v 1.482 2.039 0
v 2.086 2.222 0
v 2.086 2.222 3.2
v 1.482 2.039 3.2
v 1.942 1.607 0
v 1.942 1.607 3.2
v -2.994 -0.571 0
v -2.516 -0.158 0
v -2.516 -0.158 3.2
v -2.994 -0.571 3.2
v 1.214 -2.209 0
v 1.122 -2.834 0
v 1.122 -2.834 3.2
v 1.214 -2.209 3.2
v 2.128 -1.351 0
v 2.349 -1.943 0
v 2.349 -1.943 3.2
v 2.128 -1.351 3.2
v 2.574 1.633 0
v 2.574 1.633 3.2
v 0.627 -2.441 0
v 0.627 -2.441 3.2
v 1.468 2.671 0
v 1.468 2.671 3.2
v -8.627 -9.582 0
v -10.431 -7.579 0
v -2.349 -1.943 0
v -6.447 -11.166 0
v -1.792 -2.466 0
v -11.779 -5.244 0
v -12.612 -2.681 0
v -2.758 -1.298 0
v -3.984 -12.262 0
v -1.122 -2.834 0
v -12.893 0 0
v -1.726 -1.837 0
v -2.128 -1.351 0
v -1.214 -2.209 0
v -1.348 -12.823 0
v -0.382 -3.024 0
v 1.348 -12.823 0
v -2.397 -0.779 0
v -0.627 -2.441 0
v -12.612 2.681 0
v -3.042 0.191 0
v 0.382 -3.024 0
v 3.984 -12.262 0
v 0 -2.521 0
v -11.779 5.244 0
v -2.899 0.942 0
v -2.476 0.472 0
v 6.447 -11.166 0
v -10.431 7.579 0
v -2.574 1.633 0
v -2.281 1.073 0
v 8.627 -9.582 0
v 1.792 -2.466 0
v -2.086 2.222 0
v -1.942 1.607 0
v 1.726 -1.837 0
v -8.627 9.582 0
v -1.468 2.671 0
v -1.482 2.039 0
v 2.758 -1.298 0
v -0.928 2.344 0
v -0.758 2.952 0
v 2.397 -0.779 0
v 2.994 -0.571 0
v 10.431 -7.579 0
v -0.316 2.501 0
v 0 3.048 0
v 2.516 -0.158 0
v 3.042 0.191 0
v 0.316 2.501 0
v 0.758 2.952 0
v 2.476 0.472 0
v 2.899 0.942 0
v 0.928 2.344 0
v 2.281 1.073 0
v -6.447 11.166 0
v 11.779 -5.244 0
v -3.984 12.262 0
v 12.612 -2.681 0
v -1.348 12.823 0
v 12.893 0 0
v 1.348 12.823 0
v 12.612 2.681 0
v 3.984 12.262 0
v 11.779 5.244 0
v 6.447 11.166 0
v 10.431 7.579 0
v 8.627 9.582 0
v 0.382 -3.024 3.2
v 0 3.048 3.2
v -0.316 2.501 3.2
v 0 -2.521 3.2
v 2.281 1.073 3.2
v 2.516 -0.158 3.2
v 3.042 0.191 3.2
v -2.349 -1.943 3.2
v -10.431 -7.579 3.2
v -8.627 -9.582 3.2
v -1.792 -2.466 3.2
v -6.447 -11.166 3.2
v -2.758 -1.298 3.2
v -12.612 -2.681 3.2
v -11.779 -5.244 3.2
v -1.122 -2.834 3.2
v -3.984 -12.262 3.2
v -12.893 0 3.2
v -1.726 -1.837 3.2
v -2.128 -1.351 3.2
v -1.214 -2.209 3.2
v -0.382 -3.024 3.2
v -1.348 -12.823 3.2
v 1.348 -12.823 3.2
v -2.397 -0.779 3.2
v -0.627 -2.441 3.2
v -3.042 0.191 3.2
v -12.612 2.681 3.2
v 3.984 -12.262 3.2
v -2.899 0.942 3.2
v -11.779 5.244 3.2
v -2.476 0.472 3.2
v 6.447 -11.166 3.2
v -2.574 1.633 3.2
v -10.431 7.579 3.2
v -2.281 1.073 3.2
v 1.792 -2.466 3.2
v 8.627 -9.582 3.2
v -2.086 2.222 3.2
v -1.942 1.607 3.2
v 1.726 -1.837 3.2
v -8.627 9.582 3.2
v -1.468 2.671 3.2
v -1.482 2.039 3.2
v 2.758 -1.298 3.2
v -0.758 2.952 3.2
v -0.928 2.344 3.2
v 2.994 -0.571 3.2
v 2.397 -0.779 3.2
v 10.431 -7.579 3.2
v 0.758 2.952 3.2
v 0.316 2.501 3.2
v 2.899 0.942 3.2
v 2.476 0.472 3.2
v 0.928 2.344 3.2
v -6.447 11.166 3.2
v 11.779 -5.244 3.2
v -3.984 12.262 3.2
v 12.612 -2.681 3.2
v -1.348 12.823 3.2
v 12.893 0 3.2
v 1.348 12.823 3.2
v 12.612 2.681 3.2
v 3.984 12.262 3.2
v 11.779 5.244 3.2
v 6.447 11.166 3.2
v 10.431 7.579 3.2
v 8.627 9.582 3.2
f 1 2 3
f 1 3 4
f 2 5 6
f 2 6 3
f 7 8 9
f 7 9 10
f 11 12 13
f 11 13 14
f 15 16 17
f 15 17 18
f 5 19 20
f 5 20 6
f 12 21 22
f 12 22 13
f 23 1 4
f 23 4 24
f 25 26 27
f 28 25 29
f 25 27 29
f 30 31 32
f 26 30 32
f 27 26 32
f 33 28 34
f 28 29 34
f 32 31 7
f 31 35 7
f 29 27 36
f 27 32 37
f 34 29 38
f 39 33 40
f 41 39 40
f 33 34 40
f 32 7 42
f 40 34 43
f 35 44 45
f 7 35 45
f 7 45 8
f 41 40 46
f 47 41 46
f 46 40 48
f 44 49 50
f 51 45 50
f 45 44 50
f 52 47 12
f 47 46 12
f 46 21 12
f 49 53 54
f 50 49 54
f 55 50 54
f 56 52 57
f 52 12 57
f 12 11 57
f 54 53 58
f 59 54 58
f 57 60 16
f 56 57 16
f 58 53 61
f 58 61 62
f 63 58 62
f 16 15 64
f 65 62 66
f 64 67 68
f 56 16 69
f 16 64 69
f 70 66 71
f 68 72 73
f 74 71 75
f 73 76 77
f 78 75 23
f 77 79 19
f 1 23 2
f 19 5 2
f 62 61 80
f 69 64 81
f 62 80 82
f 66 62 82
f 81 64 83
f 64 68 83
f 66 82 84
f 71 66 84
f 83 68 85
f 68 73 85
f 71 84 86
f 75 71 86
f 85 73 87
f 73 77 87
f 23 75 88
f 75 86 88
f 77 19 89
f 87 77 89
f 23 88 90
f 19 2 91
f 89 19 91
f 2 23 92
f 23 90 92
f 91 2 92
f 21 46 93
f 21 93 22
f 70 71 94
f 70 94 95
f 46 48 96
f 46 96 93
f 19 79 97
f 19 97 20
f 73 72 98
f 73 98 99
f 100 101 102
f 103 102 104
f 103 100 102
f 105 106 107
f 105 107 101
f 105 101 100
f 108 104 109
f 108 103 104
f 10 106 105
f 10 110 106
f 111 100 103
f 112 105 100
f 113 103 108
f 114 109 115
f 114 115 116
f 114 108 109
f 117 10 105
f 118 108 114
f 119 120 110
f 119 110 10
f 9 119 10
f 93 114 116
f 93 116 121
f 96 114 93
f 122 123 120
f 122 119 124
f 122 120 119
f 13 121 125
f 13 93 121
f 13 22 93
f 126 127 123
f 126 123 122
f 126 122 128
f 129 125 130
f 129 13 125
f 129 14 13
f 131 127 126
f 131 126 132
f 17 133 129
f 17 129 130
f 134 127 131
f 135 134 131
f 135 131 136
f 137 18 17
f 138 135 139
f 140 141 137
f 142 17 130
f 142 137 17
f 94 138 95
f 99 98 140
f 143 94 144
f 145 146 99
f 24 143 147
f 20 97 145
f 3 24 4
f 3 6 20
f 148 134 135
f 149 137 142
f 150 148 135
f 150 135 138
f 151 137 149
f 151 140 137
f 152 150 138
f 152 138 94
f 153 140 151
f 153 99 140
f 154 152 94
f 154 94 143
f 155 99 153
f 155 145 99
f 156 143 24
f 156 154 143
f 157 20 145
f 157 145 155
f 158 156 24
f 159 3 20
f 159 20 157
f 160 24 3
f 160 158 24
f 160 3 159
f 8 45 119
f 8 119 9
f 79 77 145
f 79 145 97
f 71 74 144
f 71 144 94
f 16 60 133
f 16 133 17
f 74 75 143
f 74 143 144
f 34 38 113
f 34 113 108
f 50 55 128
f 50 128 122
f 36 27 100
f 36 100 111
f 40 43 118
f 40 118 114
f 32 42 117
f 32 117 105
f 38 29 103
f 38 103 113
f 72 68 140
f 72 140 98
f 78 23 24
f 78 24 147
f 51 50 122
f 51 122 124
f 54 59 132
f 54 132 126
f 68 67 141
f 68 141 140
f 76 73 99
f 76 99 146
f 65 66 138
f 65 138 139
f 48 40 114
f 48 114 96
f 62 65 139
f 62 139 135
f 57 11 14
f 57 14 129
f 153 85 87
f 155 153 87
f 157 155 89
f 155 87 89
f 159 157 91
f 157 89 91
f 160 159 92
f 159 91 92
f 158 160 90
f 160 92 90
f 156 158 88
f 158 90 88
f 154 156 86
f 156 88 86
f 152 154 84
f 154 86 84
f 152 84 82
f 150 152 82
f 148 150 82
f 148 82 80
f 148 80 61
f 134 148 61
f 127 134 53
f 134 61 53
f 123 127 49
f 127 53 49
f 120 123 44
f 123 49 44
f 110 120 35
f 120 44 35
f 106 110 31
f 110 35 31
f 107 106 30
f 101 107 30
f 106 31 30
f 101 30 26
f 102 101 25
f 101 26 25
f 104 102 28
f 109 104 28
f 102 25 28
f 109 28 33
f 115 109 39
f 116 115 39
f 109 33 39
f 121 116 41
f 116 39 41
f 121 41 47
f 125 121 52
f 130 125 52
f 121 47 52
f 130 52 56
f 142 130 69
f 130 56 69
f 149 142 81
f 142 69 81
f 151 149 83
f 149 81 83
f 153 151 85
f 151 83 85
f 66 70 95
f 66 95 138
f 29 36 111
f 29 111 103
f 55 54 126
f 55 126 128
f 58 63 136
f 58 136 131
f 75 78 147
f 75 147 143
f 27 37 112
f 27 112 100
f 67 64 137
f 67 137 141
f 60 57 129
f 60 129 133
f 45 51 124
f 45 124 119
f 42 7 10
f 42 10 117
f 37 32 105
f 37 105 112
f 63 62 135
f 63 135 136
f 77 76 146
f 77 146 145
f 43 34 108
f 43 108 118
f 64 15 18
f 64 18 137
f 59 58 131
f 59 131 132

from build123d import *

# Parameters (mm, degrees)
SKETCH1_R           = 12.893401015
BOSS_EXTRUDE1_DEPTH = 3.2004


with BuildPart() as part:
    # Sketch1 → Boss-Extrude1 (new body)
    with BuildSketch(Plane.XY):
        Circle(SKETCH1_R)
        Polygon((0, 3.048), (-0.315924789, 2.500802214), (-0.758006776, 2.952241475), (-0.927923651, 2.343667613), (-1.468385199, 2.670982761), (-1.481617658, 2.039271757), (-2.086499579, 2.221896376), (-1.942216178, 1.606740957), (-2.573511517, 1.633200071), (-2.280778112, 1.073252713), (-2.898820262, 0.941883799), (-2.47603037, 0.472328054), (-3.041985468, 0.191385504), (-2.515704533, -0.158274714), (-2.99401154, -0.571138247), (-2.397307729, -0.778932499), (-2.757912856, -1.297775281), (-2.128279263, -1.350647091), (-2.348524364, -1.942868321), (-1.725523184, -1.837495558), (-1.791569449, -2.465883799), (-1.214346137, -2.208887422), (-1.122043637, -2.833958729), (-0.626867256, -2.441486766), (-0.382015696, -3.02396561), (0, -2.520678517), (0.382015696, -3.02396561), (0.626867256, -2.441486766), (1.122043637, -2.833958729), (1.214346137, -2.208887422), (1.791569449, -2.465883799), (1.725523184, -1.837495558), (2.348524364, -1.942868321), (2.128279263, -1.350647091), (2.757912856, -1.297775281), (2.397307729, -0.778932499), (2.99401154, -0.571138247), (2.515704533, -0.158274714), (3.041985468, 0.191385504), (2.47603037, 0.472328054), (2.898820262, 0.941883799), (2.280778112, 1.073252713), (2.573511517, 1.633200071), (1.942216178, 1.606740957), (2.086499579, 2.221896376), (1.481617658, 2.039271757), (1.468385199, 2.670982761), (0.927923651, 2.343667613), (0.758006776, 2.952241475), (0.315924789, 2.500802214), align=None, mode=Mode.SUBTRACT)
    extrude(amount=BOSS_EXTRUDE1_DEPTH)


solid = part.part
